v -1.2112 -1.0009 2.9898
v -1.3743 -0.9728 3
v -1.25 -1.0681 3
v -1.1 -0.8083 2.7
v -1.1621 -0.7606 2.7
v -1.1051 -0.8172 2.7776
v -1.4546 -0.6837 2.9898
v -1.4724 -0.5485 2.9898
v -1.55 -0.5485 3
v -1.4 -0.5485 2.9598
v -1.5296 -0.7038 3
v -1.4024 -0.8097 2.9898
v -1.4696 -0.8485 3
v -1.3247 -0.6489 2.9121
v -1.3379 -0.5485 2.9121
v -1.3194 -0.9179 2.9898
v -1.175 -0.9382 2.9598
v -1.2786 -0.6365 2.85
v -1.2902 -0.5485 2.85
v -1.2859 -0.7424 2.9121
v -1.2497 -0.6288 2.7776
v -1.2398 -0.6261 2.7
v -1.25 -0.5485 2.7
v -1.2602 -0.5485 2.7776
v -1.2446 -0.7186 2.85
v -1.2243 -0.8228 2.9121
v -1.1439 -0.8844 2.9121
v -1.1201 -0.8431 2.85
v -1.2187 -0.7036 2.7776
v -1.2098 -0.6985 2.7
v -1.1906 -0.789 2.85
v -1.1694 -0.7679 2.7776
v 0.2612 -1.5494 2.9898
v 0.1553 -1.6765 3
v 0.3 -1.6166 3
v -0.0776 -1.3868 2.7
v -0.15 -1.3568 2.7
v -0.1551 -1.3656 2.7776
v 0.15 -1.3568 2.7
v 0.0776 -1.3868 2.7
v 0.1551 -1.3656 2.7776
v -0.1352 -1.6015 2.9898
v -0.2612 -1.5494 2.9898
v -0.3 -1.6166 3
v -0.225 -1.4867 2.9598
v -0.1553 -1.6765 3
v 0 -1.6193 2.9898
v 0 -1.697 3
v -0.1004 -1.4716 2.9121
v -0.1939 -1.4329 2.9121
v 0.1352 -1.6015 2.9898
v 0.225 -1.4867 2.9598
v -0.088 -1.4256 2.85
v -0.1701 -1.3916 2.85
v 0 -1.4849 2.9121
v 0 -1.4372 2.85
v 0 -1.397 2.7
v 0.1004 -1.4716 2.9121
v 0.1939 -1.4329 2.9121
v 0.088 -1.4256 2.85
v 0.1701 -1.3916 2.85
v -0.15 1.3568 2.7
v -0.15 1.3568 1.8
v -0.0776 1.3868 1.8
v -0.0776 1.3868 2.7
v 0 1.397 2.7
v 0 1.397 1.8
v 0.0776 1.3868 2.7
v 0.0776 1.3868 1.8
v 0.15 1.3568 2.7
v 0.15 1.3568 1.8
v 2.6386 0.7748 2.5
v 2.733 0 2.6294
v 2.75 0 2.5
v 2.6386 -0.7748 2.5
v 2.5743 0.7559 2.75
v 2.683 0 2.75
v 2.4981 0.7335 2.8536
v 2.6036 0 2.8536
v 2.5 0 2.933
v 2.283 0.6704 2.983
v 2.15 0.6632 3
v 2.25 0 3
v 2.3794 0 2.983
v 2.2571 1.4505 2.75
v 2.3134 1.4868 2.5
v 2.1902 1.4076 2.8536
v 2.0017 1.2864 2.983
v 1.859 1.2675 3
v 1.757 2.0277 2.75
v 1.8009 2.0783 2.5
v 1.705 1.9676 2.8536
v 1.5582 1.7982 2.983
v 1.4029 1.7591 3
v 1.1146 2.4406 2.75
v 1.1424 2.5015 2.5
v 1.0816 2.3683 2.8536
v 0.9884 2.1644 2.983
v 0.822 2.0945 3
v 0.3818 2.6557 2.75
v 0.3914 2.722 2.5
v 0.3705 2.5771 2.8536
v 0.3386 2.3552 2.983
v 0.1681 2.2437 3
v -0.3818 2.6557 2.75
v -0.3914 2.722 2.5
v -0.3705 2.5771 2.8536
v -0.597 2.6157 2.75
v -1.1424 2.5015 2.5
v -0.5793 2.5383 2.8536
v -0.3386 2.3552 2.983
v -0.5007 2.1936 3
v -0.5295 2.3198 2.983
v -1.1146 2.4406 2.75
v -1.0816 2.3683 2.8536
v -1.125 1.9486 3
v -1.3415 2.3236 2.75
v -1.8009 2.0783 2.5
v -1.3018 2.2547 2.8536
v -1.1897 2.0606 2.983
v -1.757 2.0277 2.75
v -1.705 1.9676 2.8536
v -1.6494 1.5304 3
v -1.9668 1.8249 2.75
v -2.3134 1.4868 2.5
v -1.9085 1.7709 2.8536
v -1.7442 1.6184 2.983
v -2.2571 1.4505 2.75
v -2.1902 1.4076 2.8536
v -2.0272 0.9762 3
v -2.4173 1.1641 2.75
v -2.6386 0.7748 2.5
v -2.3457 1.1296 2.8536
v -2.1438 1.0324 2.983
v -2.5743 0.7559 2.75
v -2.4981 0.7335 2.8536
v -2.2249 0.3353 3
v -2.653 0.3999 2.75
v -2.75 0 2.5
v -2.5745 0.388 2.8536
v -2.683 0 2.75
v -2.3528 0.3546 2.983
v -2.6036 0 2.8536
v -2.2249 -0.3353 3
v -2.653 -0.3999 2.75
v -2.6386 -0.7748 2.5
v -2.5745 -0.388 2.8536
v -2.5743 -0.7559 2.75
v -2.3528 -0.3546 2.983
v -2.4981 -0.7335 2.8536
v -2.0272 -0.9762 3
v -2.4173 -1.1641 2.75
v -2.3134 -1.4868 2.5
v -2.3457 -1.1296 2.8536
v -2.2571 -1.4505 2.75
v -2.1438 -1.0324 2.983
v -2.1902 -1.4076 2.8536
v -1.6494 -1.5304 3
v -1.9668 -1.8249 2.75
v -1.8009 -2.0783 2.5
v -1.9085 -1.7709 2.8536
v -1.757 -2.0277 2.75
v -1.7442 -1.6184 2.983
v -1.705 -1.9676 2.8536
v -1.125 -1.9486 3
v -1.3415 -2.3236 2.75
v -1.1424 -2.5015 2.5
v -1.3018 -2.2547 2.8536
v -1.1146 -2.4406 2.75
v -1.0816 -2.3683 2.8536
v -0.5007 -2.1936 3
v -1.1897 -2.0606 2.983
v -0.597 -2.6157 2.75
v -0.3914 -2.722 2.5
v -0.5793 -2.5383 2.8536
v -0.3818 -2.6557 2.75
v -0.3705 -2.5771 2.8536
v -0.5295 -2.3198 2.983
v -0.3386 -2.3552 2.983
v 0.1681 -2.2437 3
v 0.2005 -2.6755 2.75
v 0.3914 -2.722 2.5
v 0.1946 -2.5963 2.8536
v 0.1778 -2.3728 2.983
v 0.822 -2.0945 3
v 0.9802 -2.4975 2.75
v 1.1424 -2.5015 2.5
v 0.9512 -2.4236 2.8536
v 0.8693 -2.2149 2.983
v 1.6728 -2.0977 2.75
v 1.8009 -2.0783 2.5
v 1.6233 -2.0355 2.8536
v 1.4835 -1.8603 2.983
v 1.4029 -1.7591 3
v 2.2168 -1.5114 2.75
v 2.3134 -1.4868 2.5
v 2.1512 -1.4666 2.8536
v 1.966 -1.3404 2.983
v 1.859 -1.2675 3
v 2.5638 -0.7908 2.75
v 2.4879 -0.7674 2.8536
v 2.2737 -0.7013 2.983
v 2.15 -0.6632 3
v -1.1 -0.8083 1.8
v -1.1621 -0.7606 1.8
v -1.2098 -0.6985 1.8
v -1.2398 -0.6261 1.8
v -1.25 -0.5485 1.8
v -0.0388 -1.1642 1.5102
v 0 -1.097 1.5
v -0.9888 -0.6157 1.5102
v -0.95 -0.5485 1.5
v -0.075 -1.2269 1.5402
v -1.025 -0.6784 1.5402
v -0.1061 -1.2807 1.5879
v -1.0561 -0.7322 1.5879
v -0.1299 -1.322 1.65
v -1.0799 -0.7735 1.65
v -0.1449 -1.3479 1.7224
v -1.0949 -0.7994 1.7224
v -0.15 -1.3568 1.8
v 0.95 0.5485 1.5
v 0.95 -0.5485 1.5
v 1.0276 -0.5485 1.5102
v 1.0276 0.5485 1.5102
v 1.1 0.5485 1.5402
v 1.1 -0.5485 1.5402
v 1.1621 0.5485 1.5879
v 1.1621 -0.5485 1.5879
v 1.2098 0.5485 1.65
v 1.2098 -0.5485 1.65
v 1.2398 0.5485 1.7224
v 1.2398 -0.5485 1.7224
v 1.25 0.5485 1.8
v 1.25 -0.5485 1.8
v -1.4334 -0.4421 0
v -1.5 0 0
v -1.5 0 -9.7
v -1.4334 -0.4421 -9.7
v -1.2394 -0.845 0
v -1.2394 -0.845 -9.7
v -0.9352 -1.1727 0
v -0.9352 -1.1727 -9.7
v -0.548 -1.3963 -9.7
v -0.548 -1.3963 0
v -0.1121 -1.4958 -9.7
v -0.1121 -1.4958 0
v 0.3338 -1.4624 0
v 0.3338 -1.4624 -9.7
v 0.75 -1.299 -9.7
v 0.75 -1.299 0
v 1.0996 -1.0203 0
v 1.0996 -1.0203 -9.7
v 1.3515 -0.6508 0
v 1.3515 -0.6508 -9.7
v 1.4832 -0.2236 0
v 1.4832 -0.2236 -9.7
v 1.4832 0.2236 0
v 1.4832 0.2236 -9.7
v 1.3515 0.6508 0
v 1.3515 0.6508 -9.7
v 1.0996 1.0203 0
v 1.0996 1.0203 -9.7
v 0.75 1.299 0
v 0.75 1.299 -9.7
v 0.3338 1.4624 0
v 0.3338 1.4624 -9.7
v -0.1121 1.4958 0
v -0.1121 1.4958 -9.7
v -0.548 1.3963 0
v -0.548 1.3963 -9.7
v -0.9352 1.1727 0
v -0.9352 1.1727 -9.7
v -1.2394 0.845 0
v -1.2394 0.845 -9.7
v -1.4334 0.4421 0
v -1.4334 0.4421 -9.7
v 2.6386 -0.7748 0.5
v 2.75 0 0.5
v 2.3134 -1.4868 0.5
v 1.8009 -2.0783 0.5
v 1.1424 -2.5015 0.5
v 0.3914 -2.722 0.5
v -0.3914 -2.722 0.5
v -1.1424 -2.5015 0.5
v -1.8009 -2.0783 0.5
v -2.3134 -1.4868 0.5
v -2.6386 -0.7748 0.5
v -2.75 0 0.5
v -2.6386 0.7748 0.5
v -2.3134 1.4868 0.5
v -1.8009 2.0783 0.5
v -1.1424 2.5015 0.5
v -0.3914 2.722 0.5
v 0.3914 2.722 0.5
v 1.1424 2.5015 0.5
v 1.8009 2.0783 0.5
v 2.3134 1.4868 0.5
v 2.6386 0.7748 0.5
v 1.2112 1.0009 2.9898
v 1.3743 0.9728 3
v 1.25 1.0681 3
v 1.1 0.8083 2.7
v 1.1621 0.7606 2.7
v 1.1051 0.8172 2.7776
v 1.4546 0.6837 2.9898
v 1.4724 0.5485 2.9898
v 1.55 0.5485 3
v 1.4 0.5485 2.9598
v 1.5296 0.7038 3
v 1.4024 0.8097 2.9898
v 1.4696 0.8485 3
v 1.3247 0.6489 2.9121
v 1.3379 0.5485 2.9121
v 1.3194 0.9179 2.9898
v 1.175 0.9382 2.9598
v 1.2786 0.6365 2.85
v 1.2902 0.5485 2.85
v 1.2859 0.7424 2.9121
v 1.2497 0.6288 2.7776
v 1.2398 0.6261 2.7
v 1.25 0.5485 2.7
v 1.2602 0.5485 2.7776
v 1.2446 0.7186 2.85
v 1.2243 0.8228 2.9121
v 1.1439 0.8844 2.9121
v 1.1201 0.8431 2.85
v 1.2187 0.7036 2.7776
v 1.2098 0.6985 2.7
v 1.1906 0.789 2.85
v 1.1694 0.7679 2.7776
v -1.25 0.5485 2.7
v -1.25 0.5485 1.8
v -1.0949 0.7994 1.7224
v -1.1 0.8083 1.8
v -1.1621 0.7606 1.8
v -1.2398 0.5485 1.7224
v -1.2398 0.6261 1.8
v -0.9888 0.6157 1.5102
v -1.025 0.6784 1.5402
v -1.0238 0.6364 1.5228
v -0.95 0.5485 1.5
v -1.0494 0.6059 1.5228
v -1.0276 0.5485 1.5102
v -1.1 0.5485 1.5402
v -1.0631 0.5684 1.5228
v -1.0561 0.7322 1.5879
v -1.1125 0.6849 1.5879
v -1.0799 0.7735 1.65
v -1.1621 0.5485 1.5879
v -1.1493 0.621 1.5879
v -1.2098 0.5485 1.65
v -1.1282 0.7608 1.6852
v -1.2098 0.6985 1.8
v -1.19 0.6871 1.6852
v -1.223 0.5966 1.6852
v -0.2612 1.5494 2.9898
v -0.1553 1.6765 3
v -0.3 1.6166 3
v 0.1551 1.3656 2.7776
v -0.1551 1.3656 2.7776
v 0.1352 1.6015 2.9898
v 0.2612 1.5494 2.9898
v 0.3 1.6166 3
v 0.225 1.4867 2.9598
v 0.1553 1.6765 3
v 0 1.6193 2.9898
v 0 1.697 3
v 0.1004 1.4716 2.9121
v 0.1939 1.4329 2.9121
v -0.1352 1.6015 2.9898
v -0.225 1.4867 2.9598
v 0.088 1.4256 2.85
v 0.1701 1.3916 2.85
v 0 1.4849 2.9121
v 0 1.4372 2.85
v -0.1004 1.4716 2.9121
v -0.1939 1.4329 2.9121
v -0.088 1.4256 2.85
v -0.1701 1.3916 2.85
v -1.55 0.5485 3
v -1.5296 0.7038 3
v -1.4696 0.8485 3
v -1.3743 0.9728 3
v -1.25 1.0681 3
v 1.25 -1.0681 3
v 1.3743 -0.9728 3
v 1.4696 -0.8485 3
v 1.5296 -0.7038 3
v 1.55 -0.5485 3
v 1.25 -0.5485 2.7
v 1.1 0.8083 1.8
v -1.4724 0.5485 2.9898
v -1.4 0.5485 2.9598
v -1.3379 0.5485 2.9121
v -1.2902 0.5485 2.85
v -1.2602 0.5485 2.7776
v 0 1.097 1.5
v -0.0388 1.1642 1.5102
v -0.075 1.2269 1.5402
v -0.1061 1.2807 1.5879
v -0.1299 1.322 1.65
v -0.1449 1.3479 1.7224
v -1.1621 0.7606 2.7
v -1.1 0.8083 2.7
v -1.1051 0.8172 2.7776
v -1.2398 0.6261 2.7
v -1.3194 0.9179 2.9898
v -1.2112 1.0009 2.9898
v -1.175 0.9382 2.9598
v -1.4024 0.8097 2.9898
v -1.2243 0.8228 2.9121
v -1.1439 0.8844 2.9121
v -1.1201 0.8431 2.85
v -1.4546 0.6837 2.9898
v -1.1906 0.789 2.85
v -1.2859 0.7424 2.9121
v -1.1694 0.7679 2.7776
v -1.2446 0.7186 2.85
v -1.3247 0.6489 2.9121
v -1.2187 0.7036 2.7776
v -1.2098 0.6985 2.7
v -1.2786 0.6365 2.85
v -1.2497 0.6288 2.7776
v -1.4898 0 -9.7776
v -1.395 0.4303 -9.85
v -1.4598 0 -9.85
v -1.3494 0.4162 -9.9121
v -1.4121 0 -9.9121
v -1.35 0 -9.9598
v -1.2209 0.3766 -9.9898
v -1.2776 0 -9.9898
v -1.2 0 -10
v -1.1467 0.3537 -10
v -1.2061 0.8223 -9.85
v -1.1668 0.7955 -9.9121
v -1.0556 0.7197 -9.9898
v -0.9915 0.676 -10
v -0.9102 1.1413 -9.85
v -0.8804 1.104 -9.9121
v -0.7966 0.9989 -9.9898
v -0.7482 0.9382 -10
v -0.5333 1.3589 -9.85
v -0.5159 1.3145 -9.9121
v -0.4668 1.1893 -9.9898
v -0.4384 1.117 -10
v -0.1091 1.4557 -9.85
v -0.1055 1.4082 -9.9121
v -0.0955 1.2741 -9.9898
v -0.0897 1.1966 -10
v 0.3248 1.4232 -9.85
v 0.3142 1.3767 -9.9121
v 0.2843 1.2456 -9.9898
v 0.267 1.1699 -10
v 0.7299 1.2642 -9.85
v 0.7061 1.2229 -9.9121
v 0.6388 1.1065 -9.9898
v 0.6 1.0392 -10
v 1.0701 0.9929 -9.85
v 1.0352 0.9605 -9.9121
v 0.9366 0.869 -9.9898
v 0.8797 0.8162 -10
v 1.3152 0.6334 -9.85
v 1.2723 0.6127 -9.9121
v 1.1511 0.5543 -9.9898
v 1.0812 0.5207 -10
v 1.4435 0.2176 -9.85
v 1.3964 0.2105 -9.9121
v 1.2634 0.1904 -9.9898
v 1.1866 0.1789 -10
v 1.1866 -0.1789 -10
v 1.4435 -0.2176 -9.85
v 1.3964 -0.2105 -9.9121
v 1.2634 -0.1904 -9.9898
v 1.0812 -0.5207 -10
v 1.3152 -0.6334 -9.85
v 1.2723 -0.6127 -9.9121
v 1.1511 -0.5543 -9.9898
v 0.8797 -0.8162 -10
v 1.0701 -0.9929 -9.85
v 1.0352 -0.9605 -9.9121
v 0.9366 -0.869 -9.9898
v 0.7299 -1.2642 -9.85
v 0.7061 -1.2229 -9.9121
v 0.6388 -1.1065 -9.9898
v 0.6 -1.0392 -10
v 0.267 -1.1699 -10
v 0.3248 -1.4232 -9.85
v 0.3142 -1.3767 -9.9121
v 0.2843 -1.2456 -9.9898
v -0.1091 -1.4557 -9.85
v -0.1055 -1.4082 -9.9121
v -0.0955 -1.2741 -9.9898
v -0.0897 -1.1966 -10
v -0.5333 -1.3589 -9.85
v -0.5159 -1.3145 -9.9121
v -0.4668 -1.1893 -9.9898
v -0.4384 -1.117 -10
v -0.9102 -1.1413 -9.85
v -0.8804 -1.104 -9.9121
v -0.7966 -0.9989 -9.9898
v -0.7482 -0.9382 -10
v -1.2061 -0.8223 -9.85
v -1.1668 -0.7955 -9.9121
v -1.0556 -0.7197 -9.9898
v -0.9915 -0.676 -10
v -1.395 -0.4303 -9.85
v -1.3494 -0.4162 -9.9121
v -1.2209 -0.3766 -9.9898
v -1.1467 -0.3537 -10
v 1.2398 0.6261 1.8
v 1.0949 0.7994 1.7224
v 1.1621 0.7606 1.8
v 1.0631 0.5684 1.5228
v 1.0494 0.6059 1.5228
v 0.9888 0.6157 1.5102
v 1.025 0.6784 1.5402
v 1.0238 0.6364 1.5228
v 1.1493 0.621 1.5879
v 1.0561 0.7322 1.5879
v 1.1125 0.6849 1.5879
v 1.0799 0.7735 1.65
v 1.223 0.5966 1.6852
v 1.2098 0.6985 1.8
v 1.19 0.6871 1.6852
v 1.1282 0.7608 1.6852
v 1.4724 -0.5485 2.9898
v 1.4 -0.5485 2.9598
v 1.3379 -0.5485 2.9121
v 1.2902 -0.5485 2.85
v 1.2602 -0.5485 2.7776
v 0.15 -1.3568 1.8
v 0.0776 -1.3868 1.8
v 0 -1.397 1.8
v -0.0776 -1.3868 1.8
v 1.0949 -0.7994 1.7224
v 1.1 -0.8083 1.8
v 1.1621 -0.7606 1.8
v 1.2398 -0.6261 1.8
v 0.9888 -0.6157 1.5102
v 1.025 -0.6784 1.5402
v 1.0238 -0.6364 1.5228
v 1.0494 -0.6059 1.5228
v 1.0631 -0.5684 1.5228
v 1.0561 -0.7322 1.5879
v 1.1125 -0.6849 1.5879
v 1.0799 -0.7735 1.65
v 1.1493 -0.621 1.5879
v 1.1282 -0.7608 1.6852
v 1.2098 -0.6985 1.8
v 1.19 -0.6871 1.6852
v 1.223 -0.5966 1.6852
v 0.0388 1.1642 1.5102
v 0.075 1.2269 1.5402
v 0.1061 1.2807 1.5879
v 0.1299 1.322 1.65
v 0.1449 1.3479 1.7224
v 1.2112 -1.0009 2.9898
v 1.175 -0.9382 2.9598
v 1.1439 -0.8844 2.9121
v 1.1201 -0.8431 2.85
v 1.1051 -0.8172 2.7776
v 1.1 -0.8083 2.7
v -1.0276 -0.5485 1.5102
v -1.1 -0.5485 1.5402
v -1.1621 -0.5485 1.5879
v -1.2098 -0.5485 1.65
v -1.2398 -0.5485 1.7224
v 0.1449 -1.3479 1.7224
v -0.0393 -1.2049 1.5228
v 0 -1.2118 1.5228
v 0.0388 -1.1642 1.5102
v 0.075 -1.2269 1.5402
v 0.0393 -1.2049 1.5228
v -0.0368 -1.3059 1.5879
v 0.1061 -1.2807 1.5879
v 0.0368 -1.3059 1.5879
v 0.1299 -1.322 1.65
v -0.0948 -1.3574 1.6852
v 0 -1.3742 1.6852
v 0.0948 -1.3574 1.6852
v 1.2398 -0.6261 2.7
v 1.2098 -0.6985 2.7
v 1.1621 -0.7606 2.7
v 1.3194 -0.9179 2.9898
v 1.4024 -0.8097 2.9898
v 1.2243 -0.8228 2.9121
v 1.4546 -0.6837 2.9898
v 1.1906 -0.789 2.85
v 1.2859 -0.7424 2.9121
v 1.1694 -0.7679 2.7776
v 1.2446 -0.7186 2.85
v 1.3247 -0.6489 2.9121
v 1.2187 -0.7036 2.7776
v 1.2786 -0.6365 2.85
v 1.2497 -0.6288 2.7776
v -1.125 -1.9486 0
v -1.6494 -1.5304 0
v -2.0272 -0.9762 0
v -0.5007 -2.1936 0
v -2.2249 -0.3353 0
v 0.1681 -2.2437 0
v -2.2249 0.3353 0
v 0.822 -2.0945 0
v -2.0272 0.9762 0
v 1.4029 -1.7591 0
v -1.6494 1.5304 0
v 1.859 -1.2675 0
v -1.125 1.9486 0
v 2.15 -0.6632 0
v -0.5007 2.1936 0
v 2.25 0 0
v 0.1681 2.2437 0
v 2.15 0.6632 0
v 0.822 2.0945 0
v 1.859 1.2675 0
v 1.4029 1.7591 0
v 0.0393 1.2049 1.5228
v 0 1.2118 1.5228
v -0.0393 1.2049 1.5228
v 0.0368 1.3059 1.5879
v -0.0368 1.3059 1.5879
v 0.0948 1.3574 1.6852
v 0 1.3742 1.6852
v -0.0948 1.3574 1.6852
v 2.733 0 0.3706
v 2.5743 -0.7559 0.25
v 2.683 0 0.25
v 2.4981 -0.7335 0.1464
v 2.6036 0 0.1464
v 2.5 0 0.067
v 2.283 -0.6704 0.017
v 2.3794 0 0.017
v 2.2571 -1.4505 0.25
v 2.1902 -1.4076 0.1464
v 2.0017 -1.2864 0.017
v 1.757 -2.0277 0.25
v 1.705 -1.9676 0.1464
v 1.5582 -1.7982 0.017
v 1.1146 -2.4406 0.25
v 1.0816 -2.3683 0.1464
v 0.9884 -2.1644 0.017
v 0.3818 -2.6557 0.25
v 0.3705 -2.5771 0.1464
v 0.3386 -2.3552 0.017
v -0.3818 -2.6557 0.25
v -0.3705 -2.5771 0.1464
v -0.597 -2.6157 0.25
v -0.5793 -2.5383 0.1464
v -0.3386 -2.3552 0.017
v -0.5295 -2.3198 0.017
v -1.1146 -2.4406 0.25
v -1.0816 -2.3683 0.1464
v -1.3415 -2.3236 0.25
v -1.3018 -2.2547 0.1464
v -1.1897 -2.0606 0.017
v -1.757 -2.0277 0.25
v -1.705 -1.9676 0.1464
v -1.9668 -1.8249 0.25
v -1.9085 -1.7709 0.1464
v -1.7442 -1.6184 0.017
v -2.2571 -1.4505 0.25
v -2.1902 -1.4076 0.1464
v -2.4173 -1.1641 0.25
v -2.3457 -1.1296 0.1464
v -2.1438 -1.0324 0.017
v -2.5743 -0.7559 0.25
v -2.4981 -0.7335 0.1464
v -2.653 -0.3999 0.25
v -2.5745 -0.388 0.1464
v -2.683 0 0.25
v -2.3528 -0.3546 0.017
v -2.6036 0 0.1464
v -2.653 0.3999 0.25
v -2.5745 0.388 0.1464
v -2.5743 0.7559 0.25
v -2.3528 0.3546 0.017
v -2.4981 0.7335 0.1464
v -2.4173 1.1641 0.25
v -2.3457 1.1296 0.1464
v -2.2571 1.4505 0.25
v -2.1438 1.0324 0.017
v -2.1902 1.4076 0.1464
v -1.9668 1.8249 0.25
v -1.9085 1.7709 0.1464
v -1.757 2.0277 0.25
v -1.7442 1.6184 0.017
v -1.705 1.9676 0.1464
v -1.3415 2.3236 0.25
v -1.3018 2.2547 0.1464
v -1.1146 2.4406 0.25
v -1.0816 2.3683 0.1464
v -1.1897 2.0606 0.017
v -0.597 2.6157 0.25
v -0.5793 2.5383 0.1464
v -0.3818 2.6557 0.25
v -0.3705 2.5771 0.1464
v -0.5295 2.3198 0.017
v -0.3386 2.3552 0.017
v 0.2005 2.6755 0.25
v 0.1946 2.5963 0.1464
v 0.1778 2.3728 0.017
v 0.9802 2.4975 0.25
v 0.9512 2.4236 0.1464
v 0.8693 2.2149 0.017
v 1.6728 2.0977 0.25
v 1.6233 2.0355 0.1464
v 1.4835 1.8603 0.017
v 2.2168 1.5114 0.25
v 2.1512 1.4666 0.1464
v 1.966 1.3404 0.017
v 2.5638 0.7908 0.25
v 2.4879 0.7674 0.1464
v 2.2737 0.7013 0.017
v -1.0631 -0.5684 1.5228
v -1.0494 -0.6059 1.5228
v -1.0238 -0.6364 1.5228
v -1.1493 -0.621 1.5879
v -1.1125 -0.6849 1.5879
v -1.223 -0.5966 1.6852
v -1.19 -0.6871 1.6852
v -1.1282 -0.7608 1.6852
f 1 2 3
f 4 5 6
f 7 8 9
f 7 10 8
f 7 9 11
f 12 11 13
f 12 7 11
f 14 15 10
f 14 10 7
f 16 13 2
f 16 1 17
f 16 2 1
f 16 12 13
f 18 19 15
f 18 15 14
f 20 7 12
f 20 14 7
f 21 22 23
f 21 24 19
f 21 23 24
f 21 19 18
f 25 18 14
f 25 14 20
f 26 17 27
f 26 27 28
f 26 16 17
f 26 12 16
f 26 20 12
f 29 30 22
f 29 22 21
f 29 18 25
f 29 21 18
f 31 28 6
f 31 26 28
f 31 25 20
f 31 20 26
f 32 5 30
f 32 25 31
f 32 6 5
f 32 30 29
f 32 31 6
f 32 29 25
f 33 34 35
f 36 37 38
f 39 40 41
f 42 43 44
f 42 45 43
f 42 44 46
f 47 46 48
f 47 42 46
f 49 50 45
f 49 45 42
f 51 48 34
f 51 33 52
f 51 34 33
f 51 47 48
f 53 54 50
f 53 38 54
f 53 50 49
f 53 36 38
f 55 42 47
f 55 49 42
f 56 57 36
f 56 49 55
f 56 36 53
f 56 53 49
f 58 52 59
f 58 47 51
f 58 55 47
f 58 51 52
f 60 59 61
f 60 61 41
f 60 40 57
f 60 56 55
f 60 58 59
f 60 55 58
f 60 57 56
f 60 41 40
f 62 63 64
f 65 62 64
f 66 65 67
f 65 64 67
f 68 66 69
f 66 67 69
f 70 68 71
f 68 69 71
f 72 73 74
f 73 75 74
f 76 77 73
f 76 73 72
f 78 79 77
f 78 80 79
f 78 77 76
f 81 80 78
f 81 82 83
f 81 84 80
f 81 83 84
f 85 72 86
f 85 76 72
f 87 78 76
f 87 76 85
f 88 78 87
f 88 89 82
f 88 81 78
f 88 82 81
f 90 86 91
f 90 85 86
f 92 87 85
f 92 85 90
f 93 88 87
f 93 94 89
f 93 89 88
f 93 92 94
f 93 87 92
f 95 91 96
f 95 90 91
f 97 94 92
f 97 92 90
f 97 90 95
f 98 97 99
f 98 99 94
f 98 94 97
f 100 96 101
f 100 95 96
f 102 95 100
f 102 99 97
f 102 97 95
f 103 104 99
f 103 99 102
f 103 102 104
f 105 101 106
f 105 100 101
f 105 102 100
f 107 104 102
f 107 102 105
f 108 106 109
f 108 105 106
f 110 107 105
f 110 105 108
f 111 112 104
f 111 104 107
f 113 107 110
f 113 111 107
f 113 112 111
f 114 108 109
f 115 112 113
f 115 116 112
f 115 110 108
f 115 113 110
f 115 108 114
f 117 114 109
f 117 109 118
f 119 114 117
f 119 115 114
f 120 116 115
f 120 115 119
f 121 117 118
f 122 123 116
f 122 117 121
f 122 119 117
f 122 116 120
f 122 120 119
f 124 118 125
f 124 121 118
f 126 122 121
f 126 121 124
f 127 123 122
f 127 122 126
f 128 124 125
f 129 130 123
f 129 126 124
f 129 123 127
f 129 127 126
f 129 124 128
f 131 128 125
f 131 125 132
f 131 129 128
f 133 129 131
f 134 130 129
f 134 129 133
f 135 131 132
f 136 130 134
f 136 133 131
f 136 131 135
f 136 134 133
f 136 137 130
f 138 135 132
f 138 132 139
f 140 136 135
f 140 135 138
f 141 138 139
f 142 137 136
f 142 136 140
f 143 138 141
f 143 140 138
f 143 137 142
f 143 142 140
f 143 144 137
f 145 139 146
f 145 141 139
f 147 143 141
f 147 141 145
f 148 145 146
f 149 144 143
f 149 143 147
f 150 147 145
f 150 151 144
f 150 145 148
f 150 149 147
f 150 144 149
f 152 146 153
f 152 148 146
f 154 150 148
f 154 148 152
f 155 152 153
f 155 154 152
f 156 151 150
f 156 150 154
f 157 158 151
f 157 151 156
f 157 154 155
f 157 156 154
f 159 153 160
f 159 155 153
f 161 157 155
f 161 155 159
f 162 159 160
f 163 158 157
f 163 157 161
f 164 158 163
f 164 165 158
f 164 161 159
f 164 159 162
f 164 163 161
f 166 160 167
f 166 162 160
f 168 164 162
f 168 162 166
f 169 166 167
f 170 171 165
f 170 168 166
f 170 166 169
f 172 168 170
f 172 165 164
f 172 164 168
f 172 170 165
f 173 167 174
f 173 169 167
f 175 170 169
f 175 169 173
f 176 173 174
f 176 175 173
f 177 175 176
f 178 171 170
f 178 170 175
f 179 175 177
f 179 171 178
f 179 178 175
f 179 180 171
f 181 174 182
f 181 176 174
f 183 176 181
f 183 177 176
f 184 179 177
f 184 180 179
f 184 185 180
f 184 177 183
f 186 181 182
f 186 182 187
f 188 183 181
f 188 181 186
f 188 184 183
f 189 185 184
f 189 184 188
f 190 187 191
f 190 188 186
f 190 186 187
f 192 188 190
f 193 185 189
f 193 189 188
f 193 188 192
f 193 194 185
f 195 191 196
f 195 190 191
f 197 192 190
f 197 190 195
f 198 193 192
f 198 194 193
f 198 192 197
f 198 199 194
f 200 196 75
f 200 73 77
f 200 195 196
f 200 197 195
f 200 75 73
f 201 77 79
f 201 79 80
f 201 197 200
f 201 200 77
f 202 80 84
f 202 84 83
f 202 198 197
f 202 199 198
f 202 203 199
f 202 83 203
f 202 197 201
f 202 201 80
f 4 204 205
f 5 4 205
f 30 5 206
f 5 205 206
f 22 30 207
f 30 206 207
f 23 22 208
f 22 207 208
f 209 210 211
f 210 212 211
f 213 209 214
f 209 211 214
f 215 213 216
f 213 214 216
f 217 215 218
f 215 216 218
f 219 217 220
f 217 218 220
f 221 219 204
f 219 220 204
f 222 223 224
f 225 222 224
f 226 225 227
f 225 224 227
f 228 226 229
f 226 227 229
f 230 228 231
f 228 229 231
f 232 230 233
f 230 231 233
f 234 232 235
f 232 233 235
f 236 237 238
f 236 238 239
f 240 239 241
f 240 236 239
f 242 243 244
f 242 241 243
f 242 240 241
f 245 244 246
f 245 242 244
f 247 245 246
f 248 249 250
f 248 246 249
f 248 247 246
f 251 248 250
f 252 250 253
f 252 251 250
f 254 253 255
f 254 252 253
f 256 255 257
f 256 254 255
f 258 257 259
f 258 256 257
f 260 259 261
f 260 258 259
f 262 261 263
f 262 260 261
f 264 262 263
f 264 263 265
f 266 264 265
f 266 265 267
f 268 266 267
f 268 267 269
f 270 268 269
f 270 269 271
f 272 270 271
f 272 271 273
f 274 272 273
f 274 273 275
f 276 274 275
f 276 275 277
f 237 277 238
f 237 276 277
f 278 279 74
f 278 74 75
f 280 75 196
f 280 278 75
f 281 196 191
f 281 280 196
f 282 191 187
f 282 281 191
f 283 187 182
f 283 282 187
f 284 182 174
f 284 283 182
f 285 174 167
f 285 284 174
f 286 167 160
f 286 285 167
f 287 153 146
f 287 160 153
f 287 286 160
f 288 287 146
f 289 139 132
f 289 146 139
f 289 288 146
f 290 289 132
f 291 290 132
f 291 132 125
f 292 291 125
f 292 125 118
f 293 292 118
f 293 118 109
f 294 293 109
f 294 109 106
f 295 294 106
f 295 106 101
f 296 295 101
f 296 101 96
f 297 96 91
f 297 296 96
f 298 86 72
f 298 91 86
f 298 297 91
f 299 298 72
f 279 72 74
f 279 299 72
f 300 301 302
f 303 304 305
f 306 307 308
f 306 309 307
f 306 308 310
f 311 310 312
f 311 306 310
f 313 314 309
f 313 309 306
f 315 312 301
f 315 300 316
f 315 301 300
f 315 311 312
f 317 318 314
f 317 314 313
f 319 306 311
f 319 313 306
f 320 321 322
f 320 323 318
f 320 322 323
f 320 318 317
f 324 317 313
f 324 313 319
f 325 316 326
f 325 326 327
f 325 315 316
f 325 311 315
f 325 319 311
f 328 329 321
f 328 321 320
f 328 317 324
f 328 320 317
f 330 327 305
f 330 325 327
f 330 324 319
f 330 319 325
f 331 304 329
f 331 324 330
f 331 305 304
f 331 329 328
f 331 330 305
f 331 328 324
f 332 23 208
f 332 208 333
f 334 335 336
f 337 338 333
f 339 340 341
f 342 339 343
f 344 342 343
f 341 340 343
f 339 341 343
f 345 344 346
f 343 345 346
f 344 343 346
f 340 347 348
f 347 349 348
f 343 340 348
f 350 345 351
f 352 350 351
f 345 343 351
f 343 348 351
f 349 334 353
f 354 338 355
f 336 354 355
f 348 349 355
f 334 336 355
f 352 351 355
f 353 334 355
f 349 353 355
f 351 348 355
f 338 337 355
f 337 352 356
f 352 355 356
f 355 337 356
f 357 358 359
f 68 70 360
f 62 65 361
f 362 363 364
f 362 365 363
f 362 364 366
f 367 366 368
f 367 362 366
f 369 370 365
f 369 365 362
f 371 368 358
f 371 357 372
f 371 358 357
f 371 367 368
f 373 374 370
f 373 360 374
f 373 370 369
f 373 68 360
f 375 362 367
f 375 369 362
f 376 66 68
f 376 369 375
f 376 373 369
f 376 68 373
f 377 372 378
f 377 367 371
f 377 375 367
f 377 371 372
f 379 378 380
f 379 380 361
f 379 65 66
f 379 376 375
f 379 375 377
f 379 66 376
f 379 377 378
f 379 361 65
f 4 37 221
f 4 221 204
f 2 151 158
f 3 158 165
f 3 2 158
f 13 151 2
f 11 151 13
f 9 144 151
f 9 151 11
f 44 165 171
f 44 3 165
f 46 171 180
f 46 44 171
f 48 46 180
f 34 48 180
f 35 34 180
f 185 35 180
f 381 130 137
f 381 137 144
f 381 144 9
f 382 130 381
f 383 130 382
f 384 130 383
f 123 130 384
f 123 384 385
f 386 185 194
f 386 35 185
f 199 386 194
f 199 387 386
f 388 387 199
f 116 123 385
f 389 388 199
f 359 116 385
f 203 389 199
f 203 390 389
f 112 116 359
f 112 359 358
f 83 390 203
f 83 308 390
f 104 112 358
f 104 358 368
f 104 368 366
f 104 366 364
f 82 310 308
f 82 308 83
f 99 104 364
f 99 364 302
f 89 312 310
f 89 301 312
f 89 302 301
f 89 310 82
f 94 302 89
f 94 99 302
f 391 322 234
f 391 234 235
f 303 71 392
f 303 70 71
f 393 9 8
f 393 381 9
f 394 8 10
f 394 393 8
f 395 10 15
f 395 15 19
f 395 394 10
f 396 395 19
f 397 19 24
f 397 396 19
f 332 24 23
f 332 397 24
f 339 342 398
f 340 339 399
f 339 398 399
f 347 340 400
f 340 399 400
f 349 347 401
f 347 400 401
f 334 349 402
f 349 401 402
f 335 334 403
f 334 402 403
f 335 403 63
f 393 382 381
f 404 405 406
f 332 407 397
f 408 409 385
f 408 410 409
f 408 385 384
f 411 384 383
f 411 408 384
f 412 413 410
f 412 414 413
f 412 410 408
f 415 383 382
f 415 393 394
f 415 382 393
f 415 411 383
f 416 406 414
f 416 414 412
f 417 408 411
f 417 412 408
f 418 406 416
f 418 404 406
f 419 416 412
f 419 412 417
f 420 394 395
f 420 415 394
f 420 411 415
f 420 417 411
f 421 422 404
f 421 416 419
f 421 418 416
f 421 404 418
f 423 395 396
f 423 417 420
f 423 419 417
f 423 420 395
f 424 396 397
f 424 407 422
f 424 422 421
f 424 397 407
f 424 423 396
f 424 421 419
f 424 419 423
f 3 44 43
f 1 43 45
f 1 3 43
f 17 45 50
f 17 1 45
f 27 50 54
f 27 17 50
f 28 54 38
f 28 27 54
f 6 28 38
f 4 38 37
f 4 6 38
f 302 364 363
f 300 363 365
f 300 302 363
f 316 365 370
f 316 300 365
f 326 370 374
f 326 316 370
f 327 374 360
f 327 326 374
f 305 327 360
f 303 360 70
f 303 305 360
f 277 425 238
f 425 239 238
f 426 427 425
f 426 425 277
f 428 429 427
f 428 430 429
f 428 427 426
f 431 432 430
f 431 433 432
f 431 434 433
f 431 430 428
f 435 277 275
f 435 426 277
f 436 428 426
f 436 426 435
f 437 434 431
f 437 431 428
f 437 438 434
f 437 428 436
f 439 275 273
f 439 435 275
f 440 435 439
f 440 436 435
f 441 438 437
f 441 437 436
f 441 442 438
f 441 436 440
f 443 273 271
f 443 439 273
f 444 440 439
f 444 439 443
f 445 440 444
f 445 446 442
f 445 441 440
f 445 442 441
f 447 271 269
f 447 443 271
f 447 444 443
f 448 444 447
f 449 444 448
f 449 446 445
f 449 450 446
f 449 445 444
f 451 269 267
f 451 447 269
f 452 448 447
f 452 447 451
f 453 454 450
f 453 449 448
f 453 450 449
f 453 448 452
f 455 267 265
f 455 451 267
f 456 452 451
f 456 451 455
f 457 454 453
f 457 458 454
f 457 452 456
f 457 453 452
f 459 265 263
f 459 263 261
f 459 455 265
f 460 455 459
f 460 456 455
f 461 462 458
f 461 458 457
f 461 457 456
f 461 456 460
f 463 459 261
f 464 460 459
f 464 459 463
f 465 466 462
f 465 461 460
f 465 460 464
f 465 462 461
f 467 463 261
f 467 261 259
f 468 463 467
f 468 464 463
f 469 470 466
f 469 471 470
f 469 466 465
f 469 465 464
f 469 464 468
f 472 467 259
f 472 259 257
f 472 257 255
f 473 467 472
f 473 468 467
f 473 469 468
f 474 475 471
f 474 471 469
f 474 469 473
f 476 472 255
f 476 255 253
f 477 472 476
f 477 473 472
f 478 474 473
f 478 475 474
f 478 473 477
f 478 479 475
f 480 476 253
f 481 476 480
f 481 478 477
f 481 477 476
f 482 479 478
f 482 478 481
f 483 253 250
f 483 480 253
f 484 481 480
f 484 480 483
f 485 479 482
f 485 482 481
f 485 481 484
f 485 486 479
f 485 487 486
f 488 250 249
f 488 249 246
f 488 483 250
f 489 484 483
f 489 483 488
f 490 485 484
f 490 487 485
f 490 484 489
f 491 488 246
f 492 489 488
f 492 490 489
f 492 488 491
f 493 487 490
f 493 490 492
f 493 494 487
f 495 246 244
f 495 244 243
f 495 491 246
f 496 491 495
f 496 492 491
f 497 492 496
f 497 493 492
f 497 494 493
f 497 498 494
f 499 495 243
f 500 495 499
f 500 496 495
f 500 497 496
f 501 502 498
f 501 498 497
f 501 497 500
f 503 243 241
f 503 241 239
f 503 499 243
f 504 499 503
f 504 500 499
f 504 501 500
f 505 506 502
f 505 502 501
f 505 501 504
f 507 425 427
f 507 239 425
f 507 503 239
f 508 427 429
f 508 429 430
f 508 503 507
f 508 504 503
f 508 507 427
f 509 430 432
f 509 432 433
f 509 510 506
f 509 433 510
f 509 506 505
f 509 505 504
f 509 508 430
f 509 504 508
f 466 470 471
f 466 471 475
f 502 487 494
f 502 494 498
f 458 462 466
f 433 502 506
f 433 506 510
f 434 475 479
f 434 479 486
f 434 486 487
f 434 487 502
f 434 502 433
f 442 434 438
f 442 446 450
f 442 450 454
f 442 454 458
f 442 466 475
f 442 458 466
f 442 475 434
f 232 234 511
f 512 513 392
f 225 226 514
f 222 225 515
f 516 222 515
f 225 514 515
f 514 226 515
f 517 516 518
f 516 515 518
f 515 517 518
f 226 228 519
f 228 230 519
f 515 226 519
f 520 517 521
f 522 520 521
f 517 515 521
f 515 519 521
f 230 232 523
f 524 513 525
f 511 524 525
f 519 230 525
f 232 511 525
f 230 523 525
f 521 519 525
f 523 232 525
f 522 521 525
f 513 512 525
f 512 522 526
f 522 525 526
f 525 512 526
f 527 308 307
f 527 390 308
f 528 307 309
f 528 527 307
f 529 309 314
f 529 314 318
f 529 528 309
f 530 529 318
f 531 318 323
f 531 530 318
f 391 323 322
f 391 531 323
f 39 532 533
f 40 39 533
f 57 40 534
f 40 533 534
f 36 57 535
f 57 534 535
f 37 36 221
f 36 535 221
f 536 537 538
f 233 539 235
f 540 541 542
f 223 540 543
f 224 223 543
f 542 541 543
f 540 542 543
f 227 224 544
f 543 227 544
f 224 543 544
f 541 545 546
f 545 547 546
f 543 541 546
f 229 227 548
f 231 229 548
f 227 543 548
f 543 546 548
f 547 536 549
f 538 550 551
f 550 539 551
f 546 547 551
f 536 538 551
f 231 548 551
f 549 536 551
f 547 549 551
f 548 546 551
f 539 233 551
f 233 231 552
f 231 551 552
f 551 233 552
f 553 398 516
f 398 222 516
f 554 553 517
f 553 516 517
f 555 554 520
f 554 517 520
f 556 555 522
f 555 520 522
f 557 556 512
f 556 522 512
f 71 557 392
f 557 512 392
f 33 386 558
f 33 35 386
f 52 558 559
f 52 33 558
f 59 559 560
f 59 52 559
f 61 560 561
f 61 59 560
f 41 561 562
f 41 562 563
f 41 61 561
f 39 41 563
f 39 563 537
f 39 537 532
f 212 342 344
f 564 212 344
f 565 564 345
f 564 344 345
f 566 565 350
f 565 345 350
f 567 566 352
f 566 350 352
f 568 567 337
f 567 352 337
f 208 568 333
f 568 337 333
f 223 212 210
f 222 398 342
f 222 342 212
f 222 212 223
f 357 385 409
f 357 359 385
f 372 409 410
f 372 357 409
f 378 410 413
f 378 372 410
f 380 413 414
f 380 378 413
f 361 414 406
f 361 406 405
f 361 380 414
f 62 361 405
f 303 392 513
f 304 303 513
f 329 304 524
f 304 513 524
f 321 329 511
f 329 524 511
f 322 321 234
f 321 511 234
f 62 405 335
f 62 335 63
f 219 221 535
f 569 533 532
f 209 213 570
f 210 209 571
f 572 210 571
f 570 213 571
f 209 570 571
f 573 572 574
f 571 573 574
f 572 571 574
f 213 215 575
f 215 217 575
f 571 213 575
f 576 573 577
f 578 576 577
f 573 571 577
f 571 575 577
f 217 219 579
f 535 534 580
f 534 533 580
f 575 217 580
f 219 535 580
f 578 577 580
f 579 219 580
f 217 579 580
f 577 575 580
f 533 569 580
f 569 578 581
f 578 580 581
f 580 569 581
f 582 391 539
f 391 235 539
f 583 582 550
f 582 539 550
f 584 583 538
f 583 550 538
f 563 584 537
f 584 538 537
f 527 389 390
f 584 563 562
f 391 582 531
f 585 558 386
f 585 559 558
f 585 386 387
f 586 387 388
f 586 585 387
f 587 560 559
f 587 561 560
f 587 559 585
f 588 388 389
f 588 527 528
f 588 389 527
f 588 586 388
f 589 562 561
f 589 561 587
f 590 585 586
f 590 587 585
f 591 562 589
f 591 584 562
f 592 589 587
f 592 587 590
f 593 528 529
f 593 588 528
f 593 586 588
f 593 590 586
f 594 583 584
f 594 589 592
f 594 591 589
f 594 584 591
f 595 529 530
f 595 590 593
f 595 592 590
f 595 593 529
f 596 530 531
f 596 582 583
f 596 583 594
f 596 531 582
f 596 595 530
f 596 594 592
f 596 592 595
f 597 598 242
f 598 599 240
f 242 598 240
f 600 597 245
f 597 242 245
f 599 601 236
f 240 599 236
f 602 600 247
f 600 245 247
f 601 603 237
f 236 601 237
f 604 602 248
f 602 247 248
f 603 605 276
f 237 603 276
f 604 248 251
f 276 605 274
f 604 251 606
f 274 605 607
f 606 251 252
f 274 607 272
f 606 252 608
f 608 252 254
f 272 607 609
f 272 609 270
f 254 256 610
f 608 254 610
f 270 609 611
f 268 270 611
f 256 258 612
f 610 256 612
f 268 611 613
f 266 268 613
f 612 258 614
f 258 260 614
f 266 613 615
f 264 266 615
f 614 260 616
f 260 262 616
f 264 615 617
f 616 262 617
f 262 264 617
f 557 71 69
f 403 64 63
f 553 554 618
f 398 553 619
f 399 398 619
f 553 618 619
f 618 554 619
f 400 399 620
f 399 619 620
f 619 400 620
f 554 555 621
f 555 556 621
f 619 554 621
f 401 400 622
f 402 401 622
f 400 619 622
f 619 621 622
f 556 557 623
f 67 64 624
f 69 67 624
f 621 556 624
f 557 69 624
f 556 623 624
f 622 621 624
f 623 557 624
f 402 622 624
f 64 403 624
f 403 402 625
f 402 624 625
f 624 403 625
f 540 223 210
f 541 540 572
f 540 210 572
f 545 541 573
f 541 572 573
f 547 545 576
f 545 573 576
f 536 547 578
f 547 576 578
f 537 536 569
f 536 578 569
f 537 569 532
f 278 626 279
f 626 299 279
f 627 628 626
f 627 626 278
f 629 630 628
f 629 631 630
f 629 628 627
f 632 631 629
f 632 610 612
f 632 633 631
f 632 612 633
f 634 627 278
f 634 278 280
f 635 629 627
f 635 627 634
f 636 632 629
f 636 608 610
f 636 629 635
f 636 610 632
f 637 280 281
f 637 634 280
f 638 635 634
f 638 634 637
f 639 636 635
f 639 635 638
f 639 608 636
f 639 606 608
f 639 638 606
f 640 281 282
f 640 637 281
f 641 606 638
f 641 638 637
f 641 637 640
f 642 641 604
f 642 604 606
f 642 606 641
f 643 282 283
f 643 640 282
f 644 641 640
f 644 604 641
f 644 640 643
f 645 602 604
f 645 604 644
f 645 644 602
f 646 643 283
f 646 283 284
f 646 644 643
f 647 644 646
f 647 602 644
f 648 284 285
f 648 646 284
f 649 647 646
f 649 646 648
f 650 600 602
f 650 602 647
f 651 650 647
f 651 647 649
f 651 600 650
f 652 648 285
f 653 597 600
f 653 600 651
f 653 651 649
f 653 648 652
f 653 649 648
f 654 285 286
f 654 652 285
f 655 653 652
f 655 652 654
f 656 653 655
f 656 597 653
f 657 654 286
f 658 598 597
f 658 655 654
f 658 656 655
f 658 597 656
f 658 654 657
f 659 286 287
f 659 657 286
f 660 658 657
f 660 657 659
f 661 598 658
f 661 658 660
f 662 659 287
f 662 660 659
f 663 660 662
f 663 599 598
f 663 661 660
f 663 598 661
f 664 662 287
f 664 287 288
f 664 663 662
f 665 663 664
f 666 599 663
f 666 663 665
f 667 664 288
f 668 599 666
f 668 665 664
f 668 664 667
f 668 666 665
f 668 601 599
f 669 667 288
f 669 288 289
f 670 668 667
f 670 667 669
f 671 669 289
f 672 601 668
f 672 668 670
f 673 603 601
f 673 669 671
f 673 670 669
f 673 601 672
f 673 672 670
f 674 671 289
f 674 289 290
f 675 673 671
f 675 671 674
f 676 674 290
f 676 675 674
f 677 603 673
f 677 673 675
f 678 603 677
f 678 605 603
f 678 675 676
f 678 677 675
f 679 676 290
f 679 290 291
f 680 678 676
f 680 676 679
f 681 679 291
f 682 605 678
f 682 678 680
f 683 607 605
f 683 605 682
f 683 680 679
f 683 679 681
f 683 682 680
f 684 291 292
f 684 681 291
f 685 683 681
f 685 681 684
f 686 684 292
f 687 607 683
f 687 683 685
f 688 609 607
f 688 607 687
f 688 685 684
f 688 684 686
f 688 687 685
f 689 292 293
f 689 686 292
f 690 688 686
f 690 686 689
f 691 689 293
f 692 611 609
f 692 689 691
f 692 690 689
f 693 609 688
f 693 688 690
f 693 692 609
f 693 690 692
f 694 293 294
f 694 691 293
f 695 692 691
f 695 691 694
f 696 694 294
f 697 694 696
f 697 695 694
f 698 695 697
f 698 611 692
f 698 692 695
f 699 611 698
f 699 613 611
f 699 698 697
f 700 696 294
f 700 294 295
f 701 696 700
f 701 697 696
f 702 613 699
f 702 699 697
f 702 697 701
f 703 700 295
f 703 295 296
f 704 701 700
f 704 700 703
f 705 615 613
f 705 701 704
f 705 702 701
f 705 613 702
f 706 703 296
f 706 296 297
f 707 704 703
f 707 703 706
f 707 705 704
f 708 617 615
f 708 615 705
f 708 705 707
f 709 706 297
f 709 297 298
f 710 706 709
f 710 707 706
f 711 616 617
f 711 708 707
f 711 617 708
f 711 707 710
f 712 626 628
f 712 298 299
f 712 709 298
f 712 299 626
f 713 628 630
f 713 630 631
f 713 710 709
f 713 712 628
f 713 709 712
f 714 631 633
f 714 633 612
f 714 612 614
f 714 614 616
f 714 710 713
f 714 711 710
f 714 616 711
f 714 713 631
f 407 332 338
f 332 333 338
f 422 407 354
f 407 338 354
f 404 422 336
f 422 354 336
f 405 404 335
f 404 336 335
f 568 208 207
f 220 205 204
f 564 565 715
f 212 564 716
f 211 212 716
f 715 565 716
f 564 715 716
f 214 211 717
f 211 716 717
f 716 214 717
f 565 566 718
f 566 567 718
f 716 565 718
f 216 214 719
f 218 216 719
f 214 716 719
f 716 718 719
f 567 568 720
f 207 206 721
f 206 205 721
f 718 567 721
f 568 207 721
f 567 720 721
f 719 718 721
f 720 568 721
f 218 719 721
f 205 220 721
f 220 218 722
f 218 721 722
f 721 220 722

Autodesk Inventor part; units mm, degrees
ref_plane "YZ Plane" through (0, 0, 0) normal (1, 0, 0) x (0, 1, 0)
ref_plane "XZ Plane" through (0, 0, 0) normal (0, 1, 0) x (-1, 0, 0)
ref_plane "XY Plane" through (0, 0, 0) normal (0, 0, 1) x (1, 0, 0)
sketch "スケッチ1" plane through (0, 0, 0) normal (0, 0, 1) x (1, 0, 0)
  circle A0 centre (0, 0) radius 2.75
  dimension "d0" = 5.5
extrude "押し出し1" add sketch "スケッチ1" along normal blind 3
sketch "スケッチ2" plane through (0, 0, 0) normal (0, 0, -1) x (-1, 0, 0)
  circle A0 centre (0, 0) radius 2.75 projected
  circle A1 centre (0, 0) radius 1.5
  dimension "d3" = 3
extrude "押し出し2" add sketch "スケッチ2" along normal blind 10 contours A1
sketch "スケッチ3" plane through (0, 0, 3) normal (0, 0, 1) x (1, 0, 0)
  circle A0 centre (0, 0) radius 2.75 projected
  line L0 (0, 1.4434) -> (1.25, 0.7217)
  line L1 (1.25, 0.7217) -> (1.25, -0.7217)
  line L2 (1.25, -0.7217) -> (0, -1.4434)
  line L3 (0, -1.4434) -> (-1.25, -0.7217)
  line L4 (-1.25, -0.7217) -> (-1.25, 0.7217)
  line L5 (-1.25, 0.7217) -> (0, 1.4434)
  dimension "d6" = 1.25
extrude "押し出し3" cut sketch "スケッチ3" against normal blind 1.5 contours L0 L1 L2 L3 L4 L5
fillet "フィレット1" radius 0.5 2 edges at (-2.75, 0, 3) (-2.75, 0, 0)
fillet "フィレット2" radius 0.3 19 edges at (-0.625, 1.0825, 3) (-1.25, 0, 3) (-0.625, -1.0825, 3) (0.625, -1.0825, 3) (1.25, 0, 3) (0.625, 1.0825, 3) (-0.625, 1.0825, 1.5) (0.625, 1.0825, 1.5) (0, 1.4434, 2.25) (-1.25, 0.7217, 2.25) (-0.625, -1.0825, 1.5) (-1.25, -0.7217, 2.25) (-1.25, 0, 1.5) (1.25, 0, 1.5) (1.25, 0.7217, 2.25) (1.25, -0.7217, 2.25) (0.625, -1.0825, 1.5) (0, -1.4434, 2.25) (1.5, 0, -10)
thread "ねじ2" size "M3x0.5" class "6g" standard "ANSI Metric M Profile" full length
